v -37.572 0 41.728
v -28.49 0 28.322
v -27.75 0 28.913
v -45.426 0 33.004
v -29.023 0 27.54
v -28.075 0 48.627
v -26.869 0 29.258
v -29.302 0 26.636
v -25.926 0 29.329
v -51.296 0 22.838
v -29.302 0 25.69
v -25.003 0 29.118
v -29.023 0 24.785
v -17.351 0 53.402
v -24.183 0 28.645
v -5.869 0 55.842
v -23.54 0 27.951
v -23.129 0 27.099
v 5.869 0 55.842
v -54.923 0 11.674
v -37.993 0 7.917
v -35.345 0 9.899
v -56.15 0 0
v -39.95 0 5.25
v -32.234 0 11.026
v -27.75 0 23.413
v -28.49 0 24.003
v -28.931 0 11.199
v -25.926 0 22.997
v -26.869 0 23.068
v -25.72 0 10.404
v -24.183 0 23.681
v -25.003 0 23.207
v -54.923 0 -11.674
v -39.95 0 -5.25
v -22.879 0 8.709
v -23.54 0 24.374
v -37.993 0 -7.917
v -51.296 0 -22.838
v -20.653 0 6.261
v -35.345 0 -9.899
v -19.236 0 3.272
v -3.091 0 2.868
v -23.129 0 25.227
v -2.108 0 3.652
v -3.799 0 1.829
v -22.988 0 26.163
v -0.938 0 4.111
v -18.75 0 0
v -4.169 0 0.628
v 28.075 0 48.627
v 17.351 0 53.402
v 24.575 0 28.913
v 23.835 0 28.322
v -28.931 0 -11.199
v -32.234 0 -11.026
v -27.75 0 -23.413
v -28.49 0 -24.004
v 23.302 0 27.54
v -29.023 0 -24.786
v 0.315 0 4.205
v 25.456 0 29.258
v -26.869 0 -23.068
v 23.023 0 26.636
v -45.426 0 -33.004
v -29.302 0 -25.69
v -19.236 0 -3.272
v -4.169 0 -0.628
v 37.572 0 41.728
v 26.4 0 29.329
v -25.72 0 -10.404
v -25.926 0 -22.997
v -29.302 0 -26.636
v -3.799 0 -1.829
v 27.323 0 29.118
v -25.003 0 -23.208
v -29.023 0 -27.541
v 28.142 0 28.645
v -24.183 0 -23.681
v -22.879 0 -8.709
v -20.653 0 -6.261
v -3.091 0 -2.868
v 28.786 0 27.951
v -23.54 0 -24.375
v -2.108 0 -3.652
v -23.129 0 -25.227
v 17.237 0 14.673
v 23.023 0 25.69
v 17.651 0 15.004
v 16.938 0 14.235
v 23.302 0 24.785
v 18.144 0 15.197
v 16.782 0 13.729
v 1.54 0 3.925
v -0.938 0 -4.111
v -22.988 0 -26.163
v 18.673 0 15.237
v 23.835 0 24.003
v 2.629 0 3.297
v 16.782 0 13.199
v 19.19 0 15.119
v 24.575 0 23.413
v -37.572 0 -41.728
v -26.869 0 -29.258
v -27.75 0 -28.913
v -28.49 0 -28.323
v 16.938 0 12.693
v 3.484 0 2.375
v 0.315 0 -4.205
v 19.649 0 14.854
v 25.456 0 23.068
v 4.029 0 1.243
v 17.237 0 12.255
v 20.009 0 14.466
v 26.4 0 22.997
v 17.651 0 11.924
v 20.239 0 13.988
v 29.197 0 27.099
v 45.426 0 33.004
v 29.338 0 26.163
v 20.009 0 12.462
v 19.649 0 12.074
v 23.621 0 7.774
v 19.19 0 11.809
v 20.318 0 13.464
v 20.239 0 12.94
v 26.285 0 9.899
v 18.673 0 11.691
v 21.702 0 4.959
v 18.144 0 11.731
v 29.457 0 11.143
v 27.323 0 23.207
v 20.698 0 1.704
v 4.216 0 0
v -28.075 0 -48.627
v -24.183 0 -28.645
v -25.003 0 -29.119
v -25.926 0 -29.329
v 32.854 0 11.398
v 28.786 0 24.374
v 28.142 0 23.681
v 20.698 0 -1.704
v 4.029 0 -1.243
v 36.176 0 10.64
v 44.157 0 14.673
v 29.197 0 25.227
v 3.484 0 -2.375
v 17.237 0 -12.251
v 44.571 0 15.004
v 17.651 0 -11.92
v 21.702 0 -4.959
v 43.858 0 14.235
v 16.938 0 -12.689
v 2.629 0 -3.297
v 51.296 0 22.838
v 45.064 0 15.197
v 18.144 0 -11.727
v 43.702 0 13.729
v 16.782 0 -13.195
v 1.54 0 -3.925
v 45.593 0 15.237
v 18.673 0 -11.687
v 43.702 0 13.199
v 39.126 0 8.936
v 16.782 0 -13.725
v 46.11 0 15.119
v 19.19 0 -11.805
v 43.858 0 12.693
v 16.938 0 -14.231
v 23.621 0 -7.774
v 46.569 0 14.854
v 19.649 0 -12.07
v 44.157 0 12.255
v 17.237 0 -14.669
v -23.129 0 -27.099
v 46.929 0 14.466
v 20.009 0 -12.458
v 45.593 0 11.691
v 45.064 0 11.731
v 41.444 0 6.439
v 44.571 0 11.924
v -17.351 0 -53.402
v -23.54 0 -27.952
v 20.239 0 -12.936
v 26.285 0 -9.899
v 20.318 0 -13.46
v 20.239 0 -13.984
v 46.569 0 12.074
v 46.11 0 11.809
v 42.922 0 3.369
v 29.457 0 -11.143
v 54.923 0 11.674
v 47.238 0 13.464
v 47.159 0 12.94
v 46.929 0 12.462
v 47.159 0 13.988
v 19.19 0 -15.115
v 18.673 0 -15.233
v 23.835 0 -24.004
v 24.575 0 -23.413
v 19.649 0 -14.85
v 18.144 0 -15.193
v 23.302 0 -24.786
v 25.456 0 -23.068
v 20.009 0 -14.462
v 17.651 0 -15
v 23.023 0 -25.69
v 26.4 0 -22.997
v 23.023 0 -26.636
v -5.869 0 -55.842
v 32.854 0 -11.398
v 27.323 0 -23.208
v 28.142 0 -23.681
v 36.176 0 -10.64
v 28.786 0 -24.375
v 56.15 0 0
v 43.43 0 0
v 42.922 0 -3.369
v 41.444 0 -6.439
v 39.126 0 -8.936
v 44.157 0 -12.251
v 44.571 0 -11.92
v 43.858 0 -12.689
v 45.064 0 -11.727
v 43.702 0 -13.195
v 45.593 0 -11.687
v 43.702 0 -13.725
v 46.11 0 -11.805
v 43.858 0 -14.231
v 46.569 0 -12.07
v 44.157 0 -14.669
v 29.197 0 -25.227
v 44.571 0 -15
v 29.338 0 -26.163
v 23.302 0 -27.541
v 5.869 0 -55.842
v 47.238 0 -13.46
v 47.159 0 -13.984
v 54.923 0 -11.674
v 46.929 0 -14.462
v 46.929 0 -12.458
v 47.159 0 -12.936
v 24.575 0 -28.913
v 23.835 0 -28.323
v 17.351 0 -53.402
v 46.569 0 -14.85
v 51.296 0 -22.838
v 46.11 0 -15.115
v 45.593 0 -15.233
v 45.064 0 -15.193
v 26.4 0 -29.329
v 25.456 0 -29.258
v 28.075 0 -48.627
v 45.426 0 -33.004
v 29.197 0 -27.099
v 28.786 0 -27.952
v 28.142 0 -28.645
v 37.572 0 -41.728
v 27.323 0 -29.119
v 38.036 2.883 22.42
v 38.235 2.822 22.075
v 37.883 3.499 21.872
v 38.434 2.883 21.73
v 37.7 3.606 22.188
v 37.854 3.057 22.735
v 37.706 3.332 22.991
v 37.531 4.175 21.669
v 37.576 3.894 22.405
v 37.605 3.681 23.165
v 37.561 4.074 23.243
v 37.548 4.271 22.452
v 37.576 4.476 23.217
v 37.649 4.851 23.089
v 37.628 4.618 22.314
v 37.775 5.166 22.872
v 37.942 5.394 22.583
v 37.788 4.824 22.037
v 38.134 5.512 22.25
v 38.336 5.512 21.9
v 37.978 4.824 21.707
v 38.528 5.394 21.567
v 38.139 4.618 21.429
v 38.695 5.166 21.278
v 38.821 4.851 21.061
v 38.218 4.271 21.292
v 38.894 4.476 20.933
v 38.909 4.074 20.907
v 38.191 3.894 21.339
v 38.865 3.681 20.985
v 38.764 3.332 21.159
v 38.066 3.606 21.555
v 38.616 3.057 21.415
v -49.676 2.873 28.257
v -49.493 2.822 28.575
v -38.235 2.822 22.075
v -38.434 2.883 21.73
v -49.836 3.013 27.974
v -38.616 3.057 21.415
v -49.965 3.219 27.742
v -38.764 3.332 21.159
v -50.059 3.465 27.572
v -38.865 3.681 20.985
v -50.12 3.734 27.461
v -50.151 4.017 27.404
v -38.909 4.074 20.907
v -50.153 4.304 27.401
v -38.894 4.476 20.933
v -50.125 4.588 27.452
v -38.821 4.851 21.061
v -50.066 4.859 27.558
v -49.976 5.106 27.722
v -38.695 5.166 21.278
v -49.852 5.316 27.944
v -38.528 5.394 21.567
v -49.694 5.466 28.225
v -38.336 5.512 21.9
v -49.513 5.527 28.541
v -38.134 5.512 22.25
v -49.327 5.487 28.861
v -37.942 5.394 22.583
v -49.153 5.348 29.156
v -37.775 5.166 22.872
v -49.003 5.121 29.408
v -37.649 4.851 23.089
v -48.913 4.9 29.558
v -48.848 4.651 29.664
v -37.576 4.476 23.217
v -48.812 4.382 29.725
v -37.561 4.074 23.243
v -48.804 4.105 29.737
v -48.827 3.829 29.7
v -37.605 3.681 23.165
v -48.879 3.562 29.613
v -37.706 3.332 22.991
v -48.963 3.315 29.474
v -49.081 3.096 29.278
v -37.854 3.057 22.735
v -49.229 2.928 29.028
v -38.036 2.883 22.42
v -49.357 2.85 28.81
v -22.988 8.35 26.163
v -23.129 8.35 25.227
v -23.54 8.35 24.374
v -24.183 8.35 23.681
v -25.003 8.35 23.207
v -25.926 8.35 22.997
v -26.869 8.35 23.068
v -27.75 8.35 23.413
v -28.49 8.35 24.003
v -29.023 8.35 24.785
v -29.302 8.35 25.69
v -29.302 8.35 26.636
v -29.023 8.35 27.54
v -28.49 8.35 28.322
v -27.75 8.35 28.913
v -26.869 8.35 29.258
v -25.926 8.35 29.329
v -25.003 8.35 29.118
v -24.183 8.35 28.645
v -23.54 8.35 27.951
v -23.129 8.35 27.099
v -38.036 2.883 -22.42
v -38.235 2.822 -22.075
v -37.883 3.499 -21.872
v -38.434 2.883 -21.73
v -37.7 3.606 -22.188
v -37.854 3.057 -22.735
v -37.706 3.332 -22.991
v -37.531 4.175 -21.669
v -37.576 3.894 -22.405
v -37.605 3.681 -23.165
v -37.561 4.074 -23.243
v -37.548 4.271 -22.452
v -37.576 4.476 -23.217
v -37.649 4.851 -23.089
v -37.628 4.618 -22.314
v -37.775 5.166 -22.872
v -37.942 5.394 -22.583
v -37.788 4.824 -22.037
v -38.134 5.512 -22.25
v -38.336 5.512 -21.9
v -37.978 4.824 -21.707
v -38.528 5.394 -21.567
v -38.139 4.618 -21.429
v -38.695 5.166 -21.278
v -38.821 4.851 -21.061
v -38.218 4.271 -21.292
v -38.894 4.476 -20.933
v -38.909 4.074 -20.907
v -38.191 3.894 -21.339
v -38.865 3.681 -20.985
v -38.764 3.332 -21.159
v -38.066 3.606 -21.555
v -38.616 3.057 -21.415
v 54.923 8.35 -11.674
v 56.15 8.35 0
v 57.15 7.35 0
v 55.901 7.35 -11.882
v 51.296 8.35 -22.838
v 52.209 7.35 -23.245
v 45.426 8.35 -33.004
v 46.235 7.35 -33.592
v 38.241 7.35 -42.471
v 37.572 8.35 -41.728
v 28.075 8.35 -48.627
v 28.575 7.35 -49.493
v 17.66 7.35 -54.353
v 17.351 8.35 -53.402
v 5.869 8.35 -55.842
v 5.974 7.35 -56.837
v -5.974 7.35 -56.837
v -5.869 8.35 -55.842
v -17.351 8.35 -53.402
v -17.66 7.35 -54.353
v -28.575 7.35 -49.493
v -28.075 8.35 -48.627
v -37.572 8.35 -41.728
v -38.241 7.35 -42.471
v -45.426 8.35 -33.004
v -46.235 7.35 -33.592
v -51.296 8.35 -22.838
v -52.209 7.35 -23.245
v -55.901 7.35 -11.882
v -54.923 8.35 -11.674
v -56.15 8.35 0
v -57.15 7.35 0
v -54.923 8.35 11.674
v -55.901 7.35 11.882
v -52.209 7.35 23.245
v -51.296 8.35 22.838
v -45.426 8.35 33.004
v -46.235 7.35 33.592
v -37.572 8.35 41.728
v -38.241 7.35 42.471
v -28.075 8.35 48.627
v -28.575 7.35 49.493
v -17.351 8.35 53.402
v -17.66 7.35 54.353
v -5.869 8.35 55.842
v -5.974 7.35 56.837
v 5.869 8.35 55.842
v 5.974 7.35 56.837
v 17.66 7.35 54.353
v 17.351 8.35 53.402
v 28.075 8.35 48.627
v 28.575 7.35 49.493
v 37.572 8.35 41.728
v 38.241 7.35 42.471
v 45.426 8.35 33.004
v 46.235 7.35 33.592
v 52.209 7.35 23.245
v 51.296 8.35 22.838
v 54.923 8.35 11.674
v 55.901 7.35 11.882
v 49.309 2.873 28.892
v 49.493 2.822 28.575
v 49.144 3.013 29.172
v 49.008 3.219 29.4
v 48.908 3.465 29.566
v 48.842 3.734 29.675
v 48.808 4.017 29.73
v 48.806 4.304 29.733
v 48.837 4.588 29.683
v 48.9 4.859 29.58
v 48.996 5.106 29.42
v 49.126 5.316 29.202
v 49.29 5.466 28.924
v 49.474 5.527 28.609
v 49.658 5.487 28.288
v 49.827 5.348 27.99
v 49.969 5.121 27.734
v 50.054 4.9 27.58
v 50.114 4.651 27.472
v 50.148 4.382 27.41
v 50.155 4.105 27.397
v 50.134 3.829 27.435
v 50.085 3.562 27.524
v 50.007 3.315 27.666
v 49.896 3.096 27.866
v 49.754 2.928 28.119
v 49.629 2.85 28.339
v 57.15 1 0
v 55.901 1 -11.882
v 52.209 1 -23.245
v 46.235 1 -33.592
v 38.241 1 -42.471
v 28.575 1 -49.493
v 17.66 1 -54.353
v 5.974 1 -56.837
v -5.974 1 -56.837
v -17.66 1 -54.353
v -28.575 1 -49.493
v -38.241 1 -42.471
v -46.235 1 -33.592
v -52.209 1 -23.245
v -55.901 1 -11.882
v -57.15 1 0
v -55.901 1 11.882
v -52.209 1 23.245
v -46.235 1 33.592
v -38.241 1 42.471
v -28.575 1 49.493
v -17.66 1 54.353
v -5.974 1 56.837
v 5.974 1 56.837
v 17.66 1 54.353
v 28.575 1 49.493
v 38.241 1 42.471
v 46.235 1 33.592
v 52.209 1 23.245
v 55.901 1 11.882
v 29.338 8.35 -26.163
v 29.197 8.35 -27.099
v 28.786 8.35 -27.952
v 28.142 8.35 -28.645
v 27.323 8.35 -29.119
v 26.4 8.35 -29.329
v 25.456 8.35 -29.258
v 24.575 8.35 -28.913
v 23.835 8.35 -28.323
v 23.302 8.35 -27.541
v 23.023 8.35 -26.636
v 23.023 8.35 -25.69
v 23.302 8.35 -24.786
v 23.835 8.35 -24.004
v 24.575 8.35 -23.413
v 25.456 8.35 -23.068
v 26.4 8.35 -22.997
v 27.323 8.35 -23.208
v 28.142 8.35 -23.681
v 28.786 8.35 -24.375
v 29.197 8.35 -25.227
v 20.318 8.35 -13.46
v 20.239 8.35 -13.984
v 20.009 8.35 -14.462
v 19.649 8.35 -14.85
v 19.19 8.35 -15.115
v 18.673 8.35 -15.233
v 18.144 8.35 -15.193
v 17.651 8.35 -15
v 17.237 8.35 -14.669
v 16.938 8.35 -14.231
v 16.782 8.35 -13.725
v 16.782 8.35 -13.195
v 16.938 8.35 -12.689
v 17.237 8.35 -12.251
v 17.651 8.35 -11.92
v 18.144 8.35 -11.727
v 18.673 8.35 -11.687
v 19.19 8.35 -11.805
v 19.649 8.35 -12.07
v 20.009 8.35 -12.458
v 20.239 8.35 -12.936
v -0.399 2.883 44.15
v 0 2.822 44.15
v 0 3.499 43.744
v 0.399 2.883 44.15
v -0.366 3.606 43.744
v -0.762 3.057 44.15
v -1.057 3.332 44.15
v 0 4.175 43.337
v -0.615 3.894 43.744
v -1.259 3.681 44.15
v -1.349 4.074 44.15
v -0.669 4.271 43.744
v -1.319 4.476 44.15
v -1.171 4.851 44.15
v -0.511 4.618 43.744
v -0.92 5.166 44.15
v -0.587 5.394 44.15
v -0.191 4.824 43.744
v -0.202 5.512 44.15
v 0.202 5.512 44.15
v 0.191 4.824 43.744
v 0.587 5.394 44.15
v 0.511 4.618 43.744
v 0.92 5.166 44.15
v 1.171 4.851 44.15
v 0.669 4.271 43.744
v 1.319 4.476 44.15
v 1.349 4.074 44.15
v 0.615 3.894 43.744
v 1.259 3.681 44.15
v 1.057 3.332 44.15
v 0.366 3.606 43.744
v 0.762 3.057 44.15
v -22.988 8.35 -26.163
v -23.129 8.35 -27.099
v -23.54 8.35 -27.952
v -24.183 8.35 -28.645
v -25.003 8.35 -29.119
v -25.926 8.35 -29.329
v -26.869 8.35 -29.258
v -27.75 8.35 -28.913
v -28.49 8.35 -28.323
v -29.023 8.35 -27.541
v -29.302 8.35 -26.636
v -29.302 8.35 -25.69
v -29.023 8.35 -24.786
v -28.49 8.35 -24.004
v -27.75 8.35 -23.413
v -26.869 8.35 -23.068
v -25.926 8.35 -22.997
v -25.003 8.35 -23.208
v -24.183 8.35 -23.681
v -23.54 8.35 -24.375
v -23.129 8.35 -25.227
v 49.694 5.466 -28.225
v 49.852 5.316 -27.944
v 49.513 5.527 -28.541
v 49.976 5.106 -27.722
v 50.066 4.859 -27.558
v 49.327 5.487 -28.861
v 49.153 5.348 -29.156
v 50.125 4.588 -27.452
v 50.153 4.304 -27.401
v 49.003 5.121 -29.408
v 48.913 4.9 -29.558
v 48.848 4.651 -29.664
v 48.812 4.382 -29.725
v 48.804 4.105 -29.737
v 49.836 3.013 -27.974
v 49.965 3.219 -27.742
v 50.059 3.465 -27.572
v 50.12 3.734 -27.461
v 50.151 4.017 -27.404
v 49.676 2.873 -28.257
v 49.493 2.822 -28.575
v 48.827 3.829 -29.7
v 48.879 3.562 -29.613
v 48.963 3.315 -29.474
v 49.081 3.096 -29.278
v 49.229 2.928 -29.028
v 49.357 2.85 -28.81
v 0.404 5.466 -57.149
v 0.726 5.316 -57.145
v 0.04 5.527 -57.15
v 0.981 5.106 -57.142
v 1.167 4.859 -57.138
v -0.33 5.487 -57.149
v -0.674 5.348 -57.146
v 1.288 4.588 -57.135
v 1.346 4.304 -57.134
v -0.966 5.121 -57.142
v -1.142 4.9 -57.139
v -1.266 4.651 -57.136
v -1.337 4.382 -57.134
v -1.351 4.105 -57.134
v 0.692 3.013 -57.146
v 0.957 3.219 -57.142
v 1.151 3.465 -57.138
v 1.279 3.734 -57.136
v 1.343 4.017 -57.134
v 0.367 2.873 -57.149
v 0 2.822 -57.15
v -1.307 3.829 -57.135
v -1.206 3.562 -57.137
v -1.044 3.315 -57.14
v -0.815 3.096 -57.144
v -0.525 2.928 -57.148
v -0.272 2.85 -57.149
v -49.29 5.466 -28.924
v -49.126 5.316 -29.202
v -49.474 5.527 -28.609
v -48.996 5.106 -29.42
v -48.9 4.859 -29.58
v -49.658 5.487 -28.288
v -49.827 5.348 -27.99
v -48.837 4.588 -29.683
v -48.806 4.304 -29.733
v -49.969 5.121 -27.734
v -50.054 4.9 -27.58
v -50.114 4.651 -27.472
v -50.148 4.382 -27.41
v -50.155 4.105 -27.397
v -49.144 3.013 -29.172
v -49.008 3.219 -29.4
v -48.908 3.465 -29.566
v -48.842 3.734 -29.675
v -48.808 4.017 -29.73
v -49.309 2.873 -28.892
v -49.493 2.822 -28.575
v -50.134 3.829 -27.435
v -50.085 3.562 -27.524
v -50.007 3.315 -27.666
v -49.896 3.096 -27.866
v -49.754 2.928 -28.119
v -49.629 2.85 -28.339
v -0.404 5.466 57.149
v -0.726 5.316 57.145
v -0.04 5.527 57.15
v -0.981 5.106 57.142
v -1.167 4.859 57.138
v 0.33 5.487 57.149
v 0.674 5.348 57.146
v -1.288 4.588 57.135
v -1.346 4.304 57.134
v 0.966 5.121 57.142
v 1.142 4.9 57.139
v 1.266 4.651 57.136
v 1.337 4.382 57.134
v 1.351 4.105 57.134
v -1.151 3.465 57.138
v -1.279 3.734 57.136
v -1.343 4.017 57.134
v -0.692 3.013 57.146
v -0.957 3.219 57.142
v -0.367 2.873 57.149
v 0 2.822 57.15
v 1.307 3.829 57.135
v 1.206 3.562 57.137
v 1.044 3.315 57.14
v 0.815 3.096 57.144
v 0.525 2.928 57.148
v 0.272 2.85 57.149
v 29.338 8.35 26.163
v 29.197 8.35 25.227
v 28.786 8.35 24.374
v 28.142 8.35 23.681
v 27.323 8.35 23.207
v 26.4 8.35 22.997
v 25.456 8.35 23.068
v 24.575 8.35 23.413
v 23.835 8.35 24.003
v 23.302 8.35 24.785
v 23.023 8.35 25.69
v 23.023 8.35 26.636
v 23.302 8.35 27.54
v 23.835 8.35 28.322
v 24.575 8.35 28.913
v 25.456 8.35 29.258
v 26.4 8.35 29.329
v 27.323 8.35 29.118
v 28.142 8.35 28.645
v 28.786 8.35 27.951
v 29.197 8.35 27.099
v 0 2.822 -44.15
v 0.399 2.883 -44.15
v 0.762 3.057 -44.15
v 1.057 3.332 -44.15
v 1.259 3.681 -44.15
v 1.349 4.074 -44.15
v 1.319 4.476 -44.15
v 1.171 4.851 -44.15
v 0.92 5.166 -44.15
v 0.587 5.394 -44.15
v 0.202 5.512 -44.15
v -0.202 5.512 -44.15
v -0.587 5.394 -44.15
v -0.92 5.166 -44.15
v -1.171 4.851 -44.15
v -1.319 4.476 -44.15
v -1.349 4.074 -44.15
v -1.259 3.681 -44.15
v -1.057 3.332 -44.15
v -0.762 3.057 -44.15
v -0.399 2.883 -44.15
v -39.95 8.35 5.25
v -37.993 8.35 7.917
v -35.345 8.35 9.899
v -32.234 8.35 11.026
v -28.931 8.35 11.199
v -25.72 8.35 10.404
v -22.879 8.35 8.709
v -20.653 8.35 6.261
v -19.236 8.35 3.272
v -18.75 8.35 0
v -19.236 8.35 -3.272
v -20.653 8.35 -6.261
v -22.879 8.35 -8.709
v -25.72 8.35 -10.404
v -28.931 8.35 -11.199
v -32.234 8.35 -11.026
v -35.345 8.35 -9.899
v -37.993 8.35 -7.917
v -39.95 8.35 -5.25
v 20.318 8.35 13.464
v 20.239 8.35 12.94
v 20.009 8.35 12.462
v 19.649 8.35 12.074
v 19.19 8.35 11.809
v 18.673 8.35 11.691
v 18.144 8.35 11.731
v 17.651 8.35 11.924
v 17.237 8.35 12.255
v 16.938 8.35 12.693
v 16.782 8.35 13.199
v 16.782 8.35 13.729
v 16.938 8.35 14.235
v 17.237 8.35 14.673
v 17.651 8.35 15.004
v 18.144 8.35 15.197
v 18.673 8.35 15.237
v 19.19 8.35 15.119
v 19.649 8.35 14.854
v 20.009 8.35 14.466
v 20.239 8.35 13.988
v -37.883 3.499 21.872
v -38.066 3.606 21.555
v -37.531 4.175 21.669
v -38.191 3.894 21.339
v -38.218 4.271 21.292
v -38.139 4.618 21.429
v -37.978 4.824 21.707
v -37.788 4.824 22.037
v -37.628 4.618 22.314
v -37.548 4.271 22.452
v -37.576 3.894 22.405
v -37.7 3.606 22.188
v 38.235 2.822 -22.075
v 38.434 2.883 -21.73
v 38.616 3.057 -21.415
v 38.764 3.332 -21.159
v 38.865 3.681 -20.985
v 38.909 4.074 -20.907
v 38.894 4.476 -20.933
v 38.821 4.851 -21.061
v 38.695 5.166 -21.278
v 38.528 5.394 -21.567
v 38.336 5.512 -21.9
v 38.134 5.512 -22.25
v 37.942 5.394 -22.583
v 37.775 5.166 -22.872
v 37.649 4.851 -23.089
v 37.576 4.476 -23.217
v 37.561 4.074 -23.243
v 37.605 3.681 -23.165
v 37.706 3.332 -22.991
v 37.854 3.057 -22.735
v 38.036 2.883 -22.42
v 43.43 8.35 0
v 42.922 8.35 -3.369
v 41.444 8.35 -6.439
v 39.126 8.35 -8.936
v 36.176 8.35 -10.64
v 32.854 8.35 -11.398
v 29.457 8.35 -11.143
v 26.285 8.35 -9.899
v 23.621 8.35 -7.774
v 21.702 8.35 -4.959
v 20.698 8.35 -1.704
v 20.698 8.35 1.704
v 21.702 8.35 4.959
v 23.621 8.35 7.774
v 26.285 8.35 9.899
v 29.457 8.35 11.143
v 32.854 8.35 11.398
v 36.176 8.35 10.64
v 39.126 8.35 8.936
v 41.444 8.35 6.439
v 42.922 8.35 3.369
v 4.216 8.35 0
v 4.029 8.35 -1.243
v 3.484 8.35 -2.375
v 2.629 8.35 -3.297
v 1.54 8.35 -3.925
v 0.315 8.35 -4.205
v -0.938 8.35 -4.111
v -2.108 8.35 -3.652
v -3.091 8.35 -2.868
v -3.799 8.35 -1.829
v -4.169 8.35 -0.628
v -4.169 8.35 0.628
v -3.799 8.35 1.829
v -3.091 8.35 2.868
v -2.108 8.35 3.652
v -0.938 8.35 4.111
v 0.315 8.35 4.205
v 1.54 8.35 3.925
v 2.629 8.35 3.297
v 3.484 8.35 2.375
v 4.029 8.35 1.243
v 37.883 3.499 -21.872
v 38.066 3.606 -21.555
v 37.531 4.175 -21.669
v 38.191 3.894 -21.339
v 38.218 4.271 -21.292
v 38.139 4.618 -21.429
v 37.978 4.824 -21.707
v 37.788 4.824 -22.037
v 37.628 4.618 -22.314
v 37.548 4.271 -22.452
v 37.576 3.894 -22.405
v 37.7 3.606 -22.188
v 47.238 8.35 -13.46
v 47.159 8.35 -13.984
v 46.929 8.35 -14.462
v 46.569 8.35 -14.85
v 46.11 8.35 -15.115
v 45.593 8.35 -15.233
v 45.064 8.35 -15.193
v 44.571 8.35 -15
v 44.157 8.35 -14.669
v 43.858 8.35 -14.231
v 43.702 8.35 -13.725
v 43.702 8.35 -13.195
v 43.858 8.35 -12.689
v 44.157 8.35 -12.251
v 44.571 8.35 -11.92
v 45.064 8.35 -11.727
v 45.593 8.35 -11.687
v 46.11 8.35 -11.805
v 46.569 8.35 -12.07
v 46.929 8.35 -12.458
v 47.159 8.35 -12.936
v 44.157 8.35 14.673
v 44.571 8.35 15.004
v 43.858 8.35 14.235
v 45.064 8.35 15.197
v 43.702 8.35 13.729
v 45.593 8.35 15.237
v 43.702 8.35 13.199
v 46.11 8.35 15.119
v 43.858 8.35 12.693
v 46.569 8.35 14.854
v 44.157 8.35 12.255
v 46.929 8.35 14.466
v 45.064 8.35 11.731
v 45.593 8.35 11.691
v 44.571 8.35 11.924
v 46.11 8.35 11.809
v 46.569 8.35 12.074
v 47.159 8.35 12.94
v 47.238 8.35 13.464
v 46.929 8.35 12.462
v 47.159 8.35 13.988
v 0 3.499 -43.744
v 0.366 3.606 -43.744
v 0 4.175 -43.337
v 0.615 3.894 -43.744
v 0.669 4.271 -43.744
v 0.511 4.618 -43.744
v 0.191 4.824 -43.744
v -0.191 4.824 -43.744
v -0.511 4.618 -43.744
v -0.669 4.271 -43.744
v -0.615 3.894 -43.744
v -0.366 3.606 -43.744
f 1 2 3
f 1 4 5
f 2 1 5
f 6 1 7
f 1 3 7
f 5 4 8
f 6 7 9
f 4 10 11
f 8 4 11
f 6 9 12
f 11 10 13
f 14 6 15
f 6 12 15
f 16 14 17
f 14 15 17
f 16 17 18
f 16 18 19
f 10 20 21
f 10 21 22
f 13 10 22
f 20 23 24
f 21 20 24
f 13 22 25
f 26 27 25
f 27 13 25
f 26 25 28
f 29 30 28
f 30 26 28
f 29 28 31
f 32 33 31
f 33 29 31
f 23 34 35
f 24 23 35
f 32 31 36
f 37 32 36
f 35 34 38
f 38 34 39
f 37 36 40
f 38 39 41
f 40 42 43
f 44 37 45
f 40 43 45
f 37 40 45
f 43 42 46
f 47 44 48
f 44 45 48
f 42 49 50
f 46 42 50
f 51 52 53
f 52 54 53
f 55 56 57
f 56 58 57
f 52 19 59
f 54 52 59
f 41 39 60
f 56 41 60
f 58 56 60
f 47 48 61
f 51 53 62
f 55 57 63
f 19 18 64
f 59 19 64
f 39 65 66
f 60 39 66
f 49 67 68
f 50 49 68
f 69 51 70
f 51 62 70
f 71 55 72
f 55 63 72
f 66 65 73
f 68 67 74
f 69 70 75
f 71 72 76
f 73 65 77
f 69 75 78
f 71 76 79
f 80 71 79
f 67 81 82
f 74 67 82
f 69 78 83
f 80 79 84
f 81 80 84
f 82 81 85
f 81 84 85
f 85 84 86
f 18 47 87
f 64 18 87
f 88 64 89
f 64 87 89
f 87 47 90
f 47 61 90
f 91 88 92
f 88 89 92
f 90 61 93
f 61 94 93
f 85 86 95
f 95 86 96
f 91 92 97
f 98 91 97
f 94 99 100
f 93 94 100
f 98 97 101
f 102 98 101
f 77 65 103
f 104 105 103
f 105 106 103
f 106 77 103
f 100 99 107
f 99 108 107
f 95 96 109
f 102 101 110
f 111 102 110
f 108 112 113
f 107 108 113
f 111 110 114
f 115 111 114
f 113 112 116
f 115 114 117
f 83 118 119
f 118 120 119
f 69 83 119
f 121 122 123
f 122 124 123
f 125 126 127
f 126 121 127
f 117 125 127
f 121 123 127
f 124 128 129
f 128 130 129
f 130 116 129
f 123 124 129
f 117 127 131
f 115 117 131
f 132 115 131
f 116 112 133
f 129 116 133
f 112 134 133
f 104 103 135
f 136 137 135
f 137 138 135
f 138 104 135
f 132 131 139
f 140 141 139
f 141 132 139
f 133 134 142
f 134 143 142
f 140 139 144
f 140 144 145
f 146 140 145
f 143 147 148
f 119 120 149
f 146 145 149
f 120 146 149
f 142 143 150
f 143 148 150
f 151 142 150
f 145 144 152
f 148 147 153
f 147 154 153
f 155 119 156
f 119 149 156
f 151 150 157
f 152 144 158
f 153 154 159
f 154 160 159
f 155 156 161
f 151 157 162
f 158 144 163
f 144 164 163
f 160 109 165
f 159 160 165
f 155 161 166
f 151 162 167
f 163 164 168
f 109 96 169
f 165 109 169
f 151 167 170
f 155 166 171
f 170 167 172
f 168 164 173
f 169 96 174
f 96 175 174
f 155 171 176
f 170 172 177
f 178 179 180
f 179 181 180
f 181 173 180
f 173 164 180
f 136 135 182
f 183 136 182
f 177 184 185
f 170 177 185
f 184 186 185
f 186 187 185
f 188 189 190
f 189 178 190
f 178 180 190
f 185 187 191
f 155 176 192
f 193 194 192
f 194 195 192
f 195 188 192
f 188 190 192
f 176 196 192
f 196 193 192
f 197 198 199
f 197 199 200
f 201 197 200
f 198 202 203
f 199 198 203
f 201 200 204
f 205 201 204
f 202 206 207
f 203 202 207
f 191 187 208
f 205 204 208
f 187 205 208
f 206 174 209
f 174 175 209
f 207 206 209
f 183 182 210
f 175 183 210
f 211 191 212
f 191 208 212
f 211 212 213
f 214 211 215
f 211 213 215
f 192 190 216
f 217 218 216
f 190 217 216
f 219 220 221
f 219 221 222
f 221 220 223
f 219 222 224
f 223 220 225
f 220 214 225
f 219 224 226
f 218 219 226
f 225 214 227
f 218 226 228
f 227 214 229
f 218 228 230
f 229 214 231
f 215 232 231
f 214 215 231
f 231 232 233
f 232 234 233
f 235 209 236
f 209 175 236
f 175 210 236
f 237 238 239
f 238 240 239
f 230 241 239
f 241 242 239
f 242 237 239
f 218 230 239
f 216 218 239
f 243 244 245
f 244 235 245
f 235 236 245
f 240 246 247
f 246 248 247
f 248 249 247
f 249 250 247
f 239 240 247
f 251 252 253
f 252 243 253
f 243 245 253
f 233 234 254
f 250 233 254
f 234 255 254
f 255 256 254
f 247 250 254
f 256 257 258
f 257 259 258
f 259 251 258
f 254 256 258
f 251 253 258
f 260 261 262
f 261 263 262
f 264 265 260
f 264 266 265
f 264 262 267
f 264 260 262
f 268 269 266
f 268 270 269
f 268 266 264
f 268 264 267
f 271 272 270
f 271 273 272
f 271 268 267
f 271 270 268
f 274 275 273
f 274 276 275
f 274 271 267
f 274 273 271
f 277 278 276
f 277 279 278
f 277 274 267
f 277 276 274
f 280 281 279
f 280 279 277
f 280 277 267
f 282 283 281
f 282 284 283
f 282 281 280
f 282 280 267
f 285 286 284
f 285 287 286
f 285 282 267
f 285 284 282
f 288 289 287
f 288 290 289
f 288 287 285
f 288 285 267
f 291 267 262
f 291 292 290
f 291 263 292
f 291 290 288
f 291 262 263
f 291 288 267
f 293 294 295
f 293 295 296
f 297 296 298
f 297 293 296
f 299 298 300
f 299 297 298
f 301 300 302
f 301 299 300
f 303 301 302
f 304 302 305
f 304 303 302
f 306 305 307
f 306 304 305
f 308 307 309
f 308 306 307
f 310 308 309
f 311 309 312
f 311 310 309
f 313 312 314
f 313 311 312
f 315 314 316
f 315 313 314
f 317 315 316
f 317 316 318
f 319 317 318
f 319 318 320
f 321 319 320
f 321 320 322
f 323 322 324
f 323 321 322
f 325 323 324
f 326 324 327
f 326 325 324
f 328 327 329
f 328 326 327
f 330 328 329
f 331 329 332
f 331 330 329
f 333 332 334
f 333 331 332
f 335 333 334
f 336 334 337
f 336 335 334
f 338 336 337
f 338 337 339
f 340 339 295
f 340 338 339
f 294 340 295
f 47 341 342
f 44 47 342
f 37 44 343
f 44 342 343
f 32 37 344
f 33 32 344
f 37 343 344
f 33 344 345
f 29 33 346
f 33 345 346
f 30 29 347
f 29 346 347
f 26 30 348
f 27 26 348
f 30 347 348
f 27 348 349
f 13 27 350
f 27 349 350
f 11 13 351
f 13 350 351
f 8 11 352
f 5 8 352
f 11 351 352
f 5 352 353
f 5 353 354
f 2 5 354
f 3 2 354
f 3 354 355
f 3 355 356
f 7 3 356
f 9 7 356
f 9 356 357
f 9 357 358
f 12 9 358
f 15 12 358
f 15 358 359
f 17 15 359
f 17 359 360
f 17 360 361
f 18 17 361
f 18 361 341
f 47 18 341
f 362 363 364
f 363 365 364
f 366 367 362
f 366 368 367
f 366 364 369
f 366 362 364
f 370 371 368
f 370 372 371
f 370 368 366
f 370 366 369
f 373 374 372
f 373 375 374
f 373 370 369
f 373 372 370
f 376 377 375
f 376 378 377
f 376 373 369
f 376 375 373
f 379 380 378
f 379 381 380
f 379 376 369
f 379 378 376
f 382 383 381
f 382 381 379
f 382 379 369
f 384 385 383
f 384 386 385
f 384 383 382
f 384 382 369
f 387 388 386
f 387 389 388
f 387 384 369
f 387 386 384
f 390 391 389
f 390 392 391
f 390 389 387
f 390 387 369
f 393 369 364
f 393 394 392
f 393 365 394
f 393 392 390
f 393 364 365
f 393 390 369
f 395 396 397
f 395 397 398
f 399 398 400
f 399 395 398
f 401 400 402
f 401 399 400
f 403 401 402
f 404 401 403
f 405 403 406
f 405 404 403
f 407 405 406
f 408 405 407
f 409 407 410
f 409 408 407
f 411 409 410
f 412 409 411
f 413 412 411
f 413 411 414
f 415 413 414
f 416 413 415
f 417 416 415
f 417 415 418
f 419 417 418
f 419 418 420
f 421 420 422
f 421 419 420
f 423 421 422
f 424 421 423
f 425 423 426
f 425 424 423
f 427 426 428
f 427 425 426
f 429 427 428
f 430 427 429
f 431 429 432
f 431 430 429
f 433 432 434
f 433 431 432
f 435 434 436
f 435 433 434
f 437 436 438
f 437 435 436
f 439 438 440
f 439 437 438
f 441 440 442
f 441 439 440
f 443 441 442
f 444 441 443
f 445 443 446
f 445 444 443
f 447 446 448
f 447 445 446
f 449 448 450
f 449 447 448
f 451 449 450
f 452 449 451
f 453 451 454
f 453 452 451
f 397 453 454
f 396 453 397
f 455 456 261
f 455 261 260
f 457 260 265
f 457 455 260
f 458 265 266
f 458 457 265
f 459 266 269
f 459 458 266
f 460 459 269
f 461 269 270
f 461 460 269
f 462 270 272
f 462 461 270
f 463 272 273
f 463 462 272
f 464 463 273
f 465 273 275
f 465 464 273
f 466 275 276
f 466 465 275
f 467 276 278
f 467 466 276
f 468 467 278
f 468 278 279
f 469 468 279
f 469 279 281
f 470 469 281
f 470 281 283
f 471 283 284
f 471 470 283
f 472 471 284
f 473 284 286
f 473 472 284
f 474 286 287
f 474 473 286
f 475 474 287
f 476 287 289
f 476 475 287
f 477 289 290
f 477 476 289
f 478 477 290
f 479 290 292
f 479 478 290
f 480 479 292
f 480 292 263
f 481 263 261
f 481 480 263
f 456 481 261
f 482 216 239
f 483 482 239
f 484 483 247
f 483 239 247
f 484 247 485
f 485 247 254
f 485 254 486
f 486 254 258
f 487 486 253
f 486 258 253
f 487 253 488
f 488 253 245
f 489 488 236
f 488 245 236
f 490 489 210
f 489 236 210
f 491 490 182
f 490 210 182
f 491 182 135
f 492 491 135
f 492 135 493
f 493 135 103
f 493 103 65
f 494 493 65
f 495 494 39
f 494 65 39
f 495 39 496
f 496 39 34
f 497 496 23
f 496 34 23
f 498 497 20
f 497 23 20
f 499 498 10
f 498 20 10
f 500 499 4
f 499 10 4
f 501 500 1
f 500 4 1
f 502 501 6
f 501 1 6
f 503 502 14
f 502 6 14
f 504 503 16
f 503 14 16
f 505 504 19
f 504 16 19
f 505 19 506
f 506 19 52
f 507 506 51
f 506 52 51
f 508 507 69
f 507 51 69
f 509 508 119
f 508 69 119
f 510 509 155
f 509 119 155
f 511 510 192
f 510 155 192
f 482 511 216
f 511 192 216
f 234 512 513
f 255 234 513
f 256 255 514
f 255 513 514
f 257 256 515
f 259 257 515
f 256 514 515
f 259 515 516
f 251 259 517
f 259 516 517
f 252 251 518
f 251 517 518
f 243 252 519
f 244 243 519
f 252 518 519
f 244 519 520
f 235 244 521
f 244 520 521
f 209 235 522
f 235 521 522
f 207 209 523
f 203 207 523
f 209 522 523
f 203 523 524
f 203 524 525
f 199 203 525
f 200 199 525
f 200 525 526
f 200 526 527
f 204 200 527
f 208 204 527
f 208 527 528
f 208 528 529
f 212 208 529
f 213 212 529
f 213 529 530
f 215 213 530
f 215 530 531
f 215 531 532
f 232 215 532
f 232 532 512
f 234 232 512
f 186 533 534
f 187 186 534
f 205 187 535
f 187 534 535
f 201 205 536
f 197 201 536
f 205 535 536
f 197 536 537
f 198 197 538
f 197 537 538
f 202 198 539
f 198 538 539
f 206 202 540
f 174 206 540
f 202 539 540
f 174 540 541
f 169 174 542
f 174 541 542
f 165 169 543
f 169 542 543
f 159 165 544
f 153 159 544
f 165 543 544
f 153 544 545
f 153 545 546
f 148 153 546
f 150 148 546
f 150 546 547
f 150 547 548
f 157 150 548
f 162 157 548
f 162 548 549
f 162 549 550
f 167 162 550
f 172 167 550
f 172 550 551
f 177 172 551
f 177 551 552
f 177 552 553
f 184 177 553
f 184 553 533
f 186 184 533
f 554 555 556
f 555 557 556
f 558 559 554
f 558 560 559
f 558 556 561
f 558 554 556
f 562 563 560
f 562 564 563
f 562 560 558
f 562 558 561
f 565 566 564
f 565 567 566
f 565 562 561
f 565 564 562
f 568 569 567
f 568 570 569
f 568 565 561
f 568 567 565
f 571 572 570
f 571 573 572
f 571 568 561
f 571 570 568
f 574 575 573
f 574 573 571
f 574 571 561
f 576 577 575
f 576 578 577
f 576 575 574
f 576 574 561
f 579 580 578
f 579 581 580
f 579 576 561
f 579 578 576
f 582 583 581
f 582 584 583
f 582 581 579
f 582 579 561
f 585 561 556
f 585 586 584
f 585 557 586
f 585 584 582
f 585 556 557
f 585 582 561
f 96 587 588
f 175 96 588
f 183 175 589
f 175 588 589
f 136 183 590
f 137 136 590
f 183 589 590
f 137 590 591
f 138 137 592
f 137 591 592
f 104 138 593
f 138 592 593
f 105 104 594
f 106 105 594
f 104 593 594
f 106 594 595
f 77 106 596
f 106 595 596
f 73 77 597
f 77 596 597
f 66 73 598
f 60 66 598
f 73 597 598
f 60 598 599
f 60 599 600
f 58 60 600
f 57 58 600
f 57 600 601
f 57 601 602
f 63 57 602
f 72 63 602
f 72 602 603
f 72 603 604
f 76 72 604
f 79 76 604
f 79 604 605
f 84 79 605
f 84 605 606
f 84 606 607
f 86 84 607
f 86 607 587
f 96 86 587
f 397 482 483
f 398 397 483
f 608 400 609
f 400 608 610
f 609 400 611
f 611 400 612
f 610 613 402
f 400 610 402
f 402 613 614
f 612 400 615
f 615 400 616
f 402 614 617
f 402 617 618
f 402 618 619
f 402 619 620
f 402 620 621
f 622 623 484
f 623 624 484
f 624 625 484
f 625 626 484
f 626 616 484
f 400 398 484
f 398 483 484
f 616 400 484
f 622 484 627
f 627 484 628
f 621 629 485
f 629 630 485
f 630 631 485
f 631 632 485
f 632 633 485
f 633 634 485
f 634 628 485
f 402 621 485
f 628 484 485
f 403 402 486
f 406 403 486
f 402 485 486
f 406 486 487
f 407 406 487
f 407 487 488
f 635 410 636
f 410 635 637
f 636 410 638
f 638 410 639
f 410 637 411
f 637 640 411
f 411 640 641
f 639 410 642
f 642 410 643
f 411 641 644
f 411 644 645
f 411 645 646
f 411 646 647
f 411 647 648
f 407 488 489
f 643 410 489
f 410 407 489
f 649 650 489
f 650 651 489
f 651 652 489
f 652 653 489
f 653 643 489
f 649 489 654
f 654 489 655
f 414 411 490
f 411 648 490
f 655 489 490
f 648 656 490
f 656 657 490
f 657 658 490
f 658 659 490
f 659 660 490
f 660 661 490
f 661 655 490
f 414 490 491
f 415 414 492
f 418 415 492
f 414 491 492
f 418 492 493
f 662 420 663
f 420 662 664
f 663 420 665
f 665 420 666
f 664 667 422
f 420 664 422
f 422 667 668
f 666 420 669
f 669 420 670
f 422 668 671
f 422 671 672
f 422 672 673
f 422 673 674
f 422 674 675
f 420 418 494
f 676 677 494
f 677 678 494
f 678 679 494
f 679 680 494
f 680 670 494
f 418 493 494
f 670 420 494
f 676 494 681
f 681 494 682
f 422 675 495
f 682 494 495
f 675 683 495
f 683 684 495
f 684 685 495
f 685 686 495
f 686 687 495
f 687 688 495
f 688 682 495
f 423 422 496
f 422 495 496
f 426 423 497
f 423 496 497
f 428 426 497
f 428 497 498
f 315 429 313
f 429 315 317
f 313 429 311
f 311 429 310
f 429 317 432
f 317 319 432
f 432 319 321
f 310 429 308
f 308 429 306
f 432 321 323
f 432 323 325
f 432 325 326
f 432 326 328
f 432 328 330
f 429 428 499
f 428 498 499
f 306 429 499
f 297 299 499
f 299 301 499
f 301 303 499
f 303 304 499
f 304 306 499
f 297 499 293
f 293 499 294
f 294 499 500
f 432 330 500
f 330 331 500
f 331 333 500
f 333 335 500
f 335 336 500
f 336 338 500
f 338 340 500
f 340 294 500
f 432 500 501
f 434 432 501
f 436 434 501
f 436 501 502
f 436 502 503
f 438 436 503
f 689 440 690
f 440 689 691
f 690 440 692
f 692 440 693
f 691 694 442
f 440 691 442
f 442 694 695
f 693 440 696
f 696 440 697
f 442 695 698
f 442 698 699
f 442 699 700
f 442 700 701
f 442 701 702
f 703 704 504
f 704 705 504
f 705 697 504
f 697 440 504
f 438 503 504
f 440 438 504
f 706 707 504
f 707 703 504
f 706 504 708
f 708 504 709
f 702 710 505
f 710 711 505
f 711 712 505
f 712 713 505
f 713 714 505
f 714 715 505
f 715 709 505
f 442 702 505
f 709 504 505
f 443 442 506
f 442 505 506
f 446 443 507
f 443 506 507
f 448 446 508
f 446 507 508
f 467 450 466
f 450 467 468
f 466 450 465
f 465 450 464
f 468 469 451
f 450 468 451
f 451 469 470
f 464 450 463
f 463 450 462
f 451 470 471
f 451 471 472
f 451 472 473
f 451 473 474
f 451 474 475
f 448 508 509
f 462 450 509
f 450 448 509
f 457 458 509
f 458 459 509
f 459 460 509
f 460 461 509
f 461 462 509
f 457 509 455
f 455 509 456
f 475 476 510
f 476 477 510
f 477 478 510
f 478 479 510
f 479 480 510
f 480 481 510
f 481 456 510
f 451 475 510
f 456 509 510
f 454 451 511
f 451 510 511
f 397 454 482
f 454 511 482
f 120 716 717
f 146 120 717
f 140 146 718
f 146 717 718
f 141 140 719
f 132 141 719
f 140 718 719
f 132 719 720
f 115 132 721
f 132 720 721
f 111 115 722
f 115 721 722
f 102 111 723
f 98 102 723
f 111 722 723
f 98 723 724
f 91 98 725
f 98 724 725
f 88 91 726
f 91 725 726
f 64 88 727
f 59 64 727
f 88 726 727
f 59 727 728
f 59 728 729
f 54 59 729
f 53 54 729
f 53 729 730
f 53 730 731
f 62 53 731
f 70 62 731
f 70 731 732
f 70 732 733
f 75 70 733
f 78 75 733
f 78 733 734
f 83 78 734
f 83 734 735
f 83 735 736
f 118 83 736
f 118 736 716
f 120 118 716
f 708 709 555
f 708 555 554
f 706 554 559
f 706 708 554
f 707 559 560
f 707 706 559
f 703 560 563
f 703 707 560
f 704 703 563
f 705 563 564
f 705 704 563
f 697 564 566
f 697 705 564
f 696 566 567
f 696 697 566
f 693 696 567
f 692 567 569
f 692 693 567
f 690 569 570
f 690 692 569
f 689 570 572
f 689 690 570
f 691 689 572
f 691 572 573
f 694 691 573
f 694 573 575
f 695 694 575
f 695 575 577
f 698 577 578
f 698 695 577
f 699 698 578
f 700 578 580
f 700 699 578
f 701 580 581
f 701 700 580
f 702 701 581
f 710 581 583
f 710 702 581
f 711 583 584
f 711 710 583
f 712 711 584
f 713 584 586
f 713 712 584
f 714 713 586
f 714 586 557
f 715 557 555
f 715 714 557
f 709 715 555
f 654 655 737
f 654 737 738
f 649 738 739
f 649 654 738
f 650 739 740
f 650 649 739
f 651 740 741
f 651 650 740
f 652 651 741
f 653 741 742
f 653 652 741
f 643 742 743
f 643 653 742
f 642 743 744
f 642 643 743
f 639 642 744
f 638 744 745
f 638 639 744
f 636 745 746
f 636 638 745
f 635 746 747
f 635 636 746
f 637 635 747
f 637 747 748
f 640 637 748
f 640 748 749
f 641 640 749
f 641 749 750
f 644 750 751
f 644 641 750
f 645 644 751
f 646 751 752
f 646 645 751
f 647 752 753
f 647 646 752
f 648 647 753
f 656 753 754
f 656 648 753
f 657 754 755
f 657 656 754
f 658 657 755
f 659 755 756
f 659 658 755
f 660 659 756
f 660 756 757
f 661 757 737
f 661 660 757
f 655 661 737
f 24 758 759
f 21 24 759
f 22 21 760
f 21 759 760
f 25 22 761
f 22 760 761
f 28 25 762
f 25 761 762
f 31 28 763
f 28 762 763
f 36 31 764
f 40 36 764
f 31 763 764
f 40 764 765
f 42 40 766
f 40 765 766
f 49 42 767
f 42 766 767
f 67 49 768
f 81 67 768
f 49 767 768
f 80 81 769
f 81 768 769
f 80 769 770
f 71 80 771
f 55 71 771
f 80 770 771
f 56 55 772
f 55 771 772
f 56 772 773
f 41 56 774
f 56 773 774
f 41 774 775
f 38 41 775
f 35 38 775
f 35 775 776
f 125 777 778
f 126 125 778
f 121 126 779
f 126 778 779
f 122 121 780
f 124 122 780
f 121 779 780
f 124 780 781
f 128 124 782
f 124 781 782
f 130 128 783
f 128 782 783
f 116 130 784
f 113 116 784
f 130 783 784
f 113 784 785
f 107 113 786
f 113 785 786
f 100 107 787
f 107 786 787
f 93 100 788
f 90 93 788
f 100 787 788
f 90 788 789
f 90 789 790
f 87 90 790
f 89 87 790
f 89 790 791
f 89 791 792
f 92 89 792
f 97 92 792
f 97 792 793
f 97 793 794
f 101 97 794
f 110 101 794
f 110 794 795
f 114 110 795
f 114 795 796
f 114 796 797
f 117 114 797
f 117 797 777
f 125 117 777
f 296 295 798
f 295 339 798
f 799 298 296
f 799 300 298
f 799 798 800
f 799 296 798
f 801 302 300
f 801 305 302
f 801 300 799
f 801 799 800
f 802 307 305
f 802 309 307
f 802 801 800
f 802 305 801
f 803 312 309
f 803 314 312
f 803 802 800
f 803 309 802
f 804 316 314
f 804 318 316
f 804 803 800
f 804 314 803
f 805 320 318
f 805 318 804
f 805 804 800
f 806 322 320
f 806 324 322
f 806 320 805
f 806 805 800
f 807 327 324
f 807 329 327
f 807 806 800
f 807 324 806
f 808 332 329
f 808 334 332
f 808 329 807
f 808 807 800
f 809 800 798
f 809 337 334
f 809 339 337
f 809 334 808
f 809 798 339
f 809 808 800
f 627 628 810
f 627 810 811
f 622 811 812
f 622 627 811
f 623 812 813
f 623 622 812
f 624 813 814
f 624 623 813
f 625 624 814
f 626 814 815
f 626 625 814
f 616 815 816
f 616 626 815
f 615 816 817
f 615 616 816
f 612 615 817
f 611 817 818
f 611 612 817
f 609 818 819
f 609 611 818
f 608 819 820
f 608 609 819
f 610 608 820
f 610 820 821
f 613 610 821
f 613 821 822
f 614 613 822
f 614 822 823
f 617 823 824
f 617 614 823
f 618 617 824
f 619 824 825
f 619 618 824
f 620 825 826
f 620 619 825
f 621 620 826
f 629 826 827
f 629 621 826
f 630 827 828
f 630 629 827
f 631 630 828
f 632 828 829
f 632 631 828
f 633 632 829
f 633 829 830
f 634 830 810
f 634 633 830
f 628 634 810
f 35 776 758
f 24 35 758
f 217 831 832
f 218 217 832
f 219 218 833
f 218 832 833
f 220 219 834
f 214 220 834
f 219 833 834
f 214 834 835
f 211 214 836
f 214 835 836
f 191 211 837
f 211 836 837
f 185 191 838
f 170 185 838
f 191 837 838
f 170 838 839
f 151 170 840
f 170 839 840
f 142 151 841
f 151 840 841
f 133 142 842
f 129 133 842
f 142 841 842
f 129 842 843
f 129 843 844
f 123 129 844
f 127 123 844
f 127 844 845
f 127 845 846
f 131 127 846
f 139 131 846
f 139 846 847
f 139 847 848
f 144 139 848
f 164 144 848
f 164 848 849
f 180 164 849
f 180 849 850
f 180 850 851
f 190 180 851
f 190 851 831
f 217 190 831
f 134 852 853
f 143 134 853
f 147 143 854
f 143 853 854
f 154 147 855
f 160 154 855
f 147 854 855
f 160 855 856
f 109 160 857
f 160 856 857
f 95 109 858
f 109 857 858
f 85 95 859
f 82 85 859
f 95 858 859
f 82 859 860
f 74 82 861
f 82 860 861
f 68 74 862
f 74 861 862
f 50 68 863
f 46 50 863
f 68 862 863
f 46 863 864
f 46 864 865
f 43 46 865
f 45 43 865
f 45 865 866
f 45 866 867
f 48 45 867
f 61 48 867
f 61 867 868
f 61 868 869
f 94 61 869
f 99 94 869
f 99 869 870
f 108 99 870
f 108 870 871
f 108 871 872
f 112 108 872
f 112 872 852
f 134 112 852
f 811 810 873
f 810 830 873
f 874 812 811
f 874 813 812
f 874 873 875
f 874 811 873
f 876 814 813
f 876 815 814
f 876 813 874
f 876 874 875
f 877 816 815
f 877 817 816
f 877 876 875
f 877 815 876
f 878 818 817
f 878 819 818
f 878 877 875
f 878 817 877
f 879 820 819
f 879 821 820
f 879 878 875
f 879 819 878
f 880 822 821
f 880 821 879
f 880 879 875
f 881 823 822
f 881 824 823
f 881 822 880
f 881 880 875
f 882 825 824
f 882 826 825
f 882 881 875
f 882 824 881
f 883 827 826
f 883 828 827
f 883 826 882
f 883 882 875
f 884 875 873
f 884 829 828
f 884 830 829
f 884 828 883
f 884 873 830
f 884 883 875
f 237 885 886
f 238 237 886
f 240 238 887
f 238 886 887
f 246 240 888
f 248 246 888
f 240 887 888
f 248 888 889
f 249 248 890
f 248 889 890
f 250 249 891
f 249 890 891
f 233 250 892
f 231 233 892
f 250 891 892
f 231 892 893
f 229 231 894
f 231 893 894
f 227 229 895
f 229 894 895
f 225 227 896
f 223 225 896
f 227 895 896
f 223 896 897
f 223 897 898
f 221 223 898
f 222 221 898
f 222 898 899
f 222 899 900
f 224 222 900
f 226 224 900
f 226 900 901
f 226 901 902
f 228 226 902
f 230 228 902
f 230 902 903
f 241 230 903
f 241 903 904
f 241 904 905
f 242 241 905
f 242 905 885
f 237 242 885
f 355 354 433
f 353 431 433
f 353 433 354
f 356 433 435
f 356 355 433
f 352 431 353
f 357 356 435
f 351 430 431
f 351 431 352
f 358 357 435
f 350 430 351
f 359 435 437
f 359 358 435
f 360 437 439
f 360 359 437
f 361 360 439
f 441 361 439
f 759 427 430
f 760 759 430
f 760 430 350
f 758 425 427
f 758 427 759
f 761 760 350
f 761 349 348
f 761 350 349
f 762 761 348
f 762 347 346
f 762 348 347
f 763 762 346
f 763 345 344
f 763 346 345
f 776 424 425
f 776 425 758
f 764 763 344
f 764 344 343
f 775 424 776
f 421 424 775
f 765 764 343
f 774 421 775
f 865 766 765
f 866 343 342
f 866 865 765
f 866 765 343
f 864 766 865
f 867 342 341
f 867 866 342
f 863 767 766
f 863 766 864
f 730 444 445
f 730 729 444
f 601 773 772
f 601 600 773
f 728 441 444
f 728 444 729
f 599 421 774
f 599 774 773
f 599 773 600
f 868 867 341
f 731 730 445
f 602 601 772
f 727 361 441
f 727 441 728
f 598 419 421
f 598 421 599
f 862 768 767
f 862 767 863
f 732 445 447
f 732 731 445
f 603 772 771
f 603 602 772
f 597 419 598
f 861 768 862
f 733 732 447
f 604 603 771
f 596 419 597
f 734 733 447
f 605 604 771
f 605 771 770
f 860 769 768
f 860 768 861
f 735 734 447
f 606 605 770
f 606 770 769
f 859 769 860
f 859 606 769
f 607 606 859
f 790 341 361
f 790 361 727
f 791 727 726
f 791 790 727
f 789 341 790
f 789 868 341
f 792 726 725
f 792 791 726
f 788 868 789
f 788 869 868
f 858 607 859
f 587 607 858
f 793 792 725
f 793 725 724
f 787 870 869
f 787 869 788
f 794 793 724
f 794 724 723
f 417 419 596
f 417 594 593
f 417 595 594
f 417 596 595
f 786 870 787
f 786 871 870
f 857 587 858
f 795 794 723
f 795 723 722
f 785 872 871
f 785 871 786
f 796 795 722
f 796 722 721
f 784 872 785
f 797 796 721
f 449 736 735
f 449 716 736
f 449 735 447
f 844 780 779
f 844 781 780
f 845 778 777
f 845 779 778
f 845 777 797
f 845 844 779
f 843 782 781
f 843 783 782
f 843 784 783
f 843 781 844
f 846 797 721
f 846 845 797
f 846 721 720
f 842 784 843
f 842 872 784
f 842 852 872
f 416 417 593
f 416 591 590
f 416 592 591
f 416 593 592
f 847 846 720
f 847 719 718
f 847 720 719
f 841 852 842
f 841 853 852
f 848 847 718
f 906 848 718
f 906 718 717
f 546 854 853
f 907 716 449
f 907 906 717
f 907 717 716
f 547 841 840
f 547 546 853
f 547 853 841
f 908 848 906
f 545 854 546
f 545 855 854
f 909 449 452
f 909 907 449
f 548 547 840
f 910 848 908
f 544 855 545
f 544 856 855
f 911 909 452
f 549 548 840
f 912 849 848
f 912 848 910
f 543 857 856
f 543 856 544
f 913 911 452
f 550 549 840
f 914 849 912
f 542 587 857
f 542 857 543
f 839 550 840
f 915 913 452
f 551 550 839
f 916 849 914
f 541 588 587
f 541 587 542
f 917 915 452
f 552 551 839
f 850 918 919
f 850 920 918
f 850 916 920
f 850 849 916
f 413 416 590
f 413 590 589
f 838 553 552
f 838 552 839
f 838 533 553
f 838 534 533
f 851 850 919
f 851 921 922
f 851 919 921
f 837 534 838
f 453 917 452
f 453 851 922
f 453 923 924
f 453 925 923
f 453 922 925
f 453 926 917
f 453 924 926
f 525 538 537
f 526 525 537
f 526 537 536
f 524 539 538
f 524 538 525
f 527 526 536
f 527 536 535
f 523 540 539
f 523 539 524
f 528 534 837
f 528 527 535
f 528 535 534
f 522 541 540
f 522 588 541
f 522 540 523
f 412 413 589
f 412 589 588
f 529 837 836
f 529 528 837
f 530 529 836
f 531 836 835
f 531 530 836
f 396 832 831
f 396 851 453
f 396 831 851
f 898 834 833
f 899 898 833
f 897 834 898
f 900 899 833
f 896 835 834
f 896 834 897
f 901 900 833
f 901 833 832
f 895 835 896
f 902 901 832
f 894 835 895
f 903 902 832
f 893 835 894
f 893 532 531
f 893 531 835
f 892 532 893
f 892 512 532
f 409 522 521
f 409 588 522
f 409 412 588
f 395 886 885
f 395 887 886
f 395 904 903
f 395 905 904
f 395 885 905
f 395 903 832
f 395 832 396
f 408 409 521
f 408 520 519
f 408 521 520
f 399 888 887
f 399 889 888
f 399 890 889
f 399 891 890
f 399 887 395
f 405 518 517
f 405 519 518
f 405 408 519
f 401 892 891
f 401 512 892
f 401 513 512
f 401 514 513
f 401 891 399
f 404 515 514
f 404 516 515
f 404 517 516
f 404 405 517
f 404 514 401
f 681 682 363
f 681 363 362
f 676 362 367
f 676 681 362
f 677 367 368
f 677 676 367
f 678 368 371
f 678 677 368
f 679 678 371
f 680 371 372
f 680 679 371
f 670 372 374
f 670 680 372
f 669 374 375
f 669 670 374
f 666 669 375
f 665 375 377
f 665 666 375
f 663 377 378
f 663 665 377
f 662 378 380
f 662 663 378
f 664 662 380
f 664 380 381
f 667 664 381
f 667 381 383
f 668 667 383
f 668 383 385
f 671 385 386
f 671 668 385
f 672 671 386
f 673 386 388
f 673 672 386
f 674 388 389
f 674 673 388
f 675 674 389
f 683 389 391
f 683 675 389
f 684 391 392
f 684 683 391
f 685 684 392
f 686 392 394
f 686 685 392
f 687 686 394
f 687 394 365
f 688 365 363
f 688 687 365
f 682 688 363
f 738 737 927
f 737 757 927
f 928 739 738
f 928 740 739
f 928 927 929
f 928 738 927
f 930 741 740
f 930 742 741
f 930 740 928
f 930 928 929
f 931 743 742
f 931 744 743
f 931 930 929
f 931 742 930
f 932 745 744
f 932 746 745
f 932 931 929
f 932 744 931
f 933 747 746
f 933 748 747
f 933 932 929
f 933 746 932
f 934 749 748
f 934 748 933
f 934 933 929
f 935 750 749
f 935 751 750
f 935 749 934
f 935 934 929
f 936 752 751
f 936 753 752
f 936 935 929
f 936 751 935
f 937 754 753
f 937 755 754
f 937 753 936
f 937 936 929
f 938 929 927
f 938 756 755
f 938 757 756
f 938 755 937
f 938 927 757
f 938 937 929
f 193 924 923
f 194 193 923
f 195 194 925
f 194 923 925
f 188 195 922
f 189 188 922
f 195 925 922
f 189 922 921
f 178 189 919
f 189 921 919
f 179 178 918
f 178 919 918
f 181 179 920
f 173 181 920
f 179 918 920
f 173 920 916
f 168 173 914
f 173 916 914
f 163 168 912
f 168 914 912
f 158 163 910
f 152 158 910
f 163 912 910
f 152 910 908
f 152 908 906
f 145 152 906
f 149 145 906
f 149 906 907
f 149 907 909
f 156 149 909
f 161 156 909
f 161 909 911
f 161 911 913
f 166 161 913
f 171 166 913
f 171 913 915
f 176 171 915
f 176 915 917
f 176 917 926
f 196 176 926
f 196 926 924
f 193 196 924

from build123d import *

# Parameters (mm, degrees)
SKETCH2_R           = 57.15
BOSS_EXTRUDE1_DEPTH = 8.35
CUT_EXTRUDE1_REACH  = 10.35
SKETCH6_R           = 3.175
SKETCH7_R           = 11.43
SKETCH7_R_2         = 1.778
CUT_EXTRUDE2_DEPTH  = 9.35
SKETCH8_R           = 4.2164
CUT_EXTRUDE3_DEPTH  = 9.35
CHAMFER1_SIZE       = 1
CIRPATTERN1_COUNT   = 6


with BuildPart() as part:
    # Sketch2 → Boss-Extrude1 (new body)
    with BuildSketch(Plane(origin=(0, 0, 0), x_dir=(1, 0, 0), z_dir=(0, 1, 0))):
        Circle(SKETCH2_R)
    extrude(amount=BOSS_EXTRUDE1_DEPTH)

    # Sketch6 → Cut-Extrude1 (cut, up to next)
    with BuildSketch(Plane(origin=(0, 8.35, 0), x_dir=(1, 0, 0), z_dir=(0, 1, 0)), mode=Mode.PRIVATE) as cut_extrude1_sk1:
        with Locations((-26.1629, -26.1629)):
            Circle(SKETCH6_R)
    cut_extrude1_tool1 = extrude(cut_extrude1_sk1.sketch, amount=-CUT_EXTRUDE1_REACH, mode=Mode.PRIVATE) & part.part
    add(cut_extrude1_tool1.solids().sort_by_distance((-26.1629, 8.35, 26.1629))[0], mode=Mode.SUBTRACT)
    # Sketch6 → Cut-Extrude1 (cut, up to next)
    with BuildSketch(Plane(origin=(0, 8.35, 0), x_dir=(1, 0, 0), z_dir=(0, 1, 0)), mode=Mode.PRIVATE) as cut_extrude1_sk2:
        with Locations((26.1629, -26.1629)):
            Circle(SKETCH6_R)
    cut_extrude1_tool2 = extrude(cut_extrude1_sk2.sketch, amount=-CUT_EXTRUDE1_REACH, mode=Mode.PRIVATE) & part.part
    add(cut_extrude1_tool2.solids().sort_by_distance((26.1629, 8.35, 26.1629))[0], mode=Mode.SUBTRACT)
    # Sketch6 → Cut-Extrude1 (cut, up to next)
    with BuildSketch(Plane(origin=(0, 8.35, 0), x_dir=(1, 0, 0), z_dir=(0, 1, 0)), mode=Mode.PRIVATE) as cut_extrude1_sk3:
        with Locations((-26.1629, 26.163103615)):
            Circle(SKETCH6_R)
    cut_extrude1_tool3 = extrude(cut_extrude1_sk3.sketch, amount=-CUT_EXTRUDE1_REACH, mode=Mode.PRIVATE) & part.part
    add(cut_extrude1_tool3.solids().sort_by_distance((-26.1629, 8.35, -26.163104))[0], mode=Mode.SUBTRACT)
    # Sketch6 → Cut-Extrude1 (cut, up to next)
    with BuildSketch(Plane(origin=(0, 8.35, 0), x_dir=(1, 0, 0), z_dir=(0, 1, 0)), mode=Mode.PRIVATE) as cut_extrude1_sk4:
        with Locations((26.1629, 26.163103615)):
            Circle(SKETCH6_R)
    cut_extrude1_tool4 = extrude(cut_extrude1_sk4.sketch, amount=-CUT_EXTRUDE1_REACH, mode=Mode.PRIVATE) & part.part
    add(cut_extrude1_tool4.solids().sort_by_distance((26.1629, 8.35, -26.163104))[0], mode=Mode.SUBTRACT)

    # Sketch7 → Cut-Extrude2 (cut, through all)
    with BuildSketch(Plane(origin=(0, 8.35, 0), x_dir=(1, 0, 0), z_dir=(0, 1, 0))):
        with Locations((32, 0)):
            Circle(SKETCH7_R)
        with Locations((18.54, -13.464)):
            Circle(SKETCH7_R_2)
        with Locations((18.54, 13.46)):
            Circle(SKETCH7_R_2)
        with Locations((45.46, 13.46)):
            Circle(SKETCH7_R_2)
        with Locations((45.46, -13.464)):
            Circle(SKETCH7_R_2)
    extrude(amount=-CUT_EXTRUDE2_DEPTH, mode=Mode.SUBTRACT)

    # Sketch8 → Cut-Extrude3 (cut, through all)
    with BuildSketch(Plane(origin=(0, 8.35, 0), x_dir=(1, 0, 0), z_dir=(0, 1, 0))):
        Circle(SKETCH8_R)
        with BuildLine():
            Line((-39.95, 5.249761899), (-39.95, -5.249761899))
            ThreePointArc((-39.95, -5.249761899), (-18.75, 0), (-39.95, 5.249761899))
        make_face()
    extrude(amount=-CUT_EXTRUDE3_DEPTH, mode=Mode.SUBTRACT)

    # Chamfer1
    chamfer1_edges = [part.edges().sort_by_distance(p)[0] for p in [
        (-57.15, 0, 0),
        (-57.15, 8.35, 0),
    ]]
    chamfer(chamfer1_edges, length=CHAMFER1_SIZE)

    # Sketch11 → #6-32 Tapped Hole1 (revolve, cut)
    with BuildSketch(Plane(origin=(0, 4.175, 57.15), x_dir=(0, -1, 0), z_dir=(1, 0, 0))):
        Polygon((0, 0), (0, 13.81269403), (1.35255, 13), (1.35255, 0), align=None)
    f_6_32_tapped_hole1 = revolve(axis=Axis((0, 4.175, 63.5), (0, 0, -1)), mode=Mode.SUBTRACT)

    # CirPattern1: #6-32 Tapped Hole1 ×6 about axis
    cirpattern1_axis = Axis((0, 1, 0), (0, 1, 0))
    for i in range(1, CIRPATTERN1_COUNT):
        add(f_6_32_tapped_hole1.rotate(cirpattern1_axis, i * 360 / CIRPATTERN1_COUNT), mode=Mode.SUBTRACT)


solid = part.part
